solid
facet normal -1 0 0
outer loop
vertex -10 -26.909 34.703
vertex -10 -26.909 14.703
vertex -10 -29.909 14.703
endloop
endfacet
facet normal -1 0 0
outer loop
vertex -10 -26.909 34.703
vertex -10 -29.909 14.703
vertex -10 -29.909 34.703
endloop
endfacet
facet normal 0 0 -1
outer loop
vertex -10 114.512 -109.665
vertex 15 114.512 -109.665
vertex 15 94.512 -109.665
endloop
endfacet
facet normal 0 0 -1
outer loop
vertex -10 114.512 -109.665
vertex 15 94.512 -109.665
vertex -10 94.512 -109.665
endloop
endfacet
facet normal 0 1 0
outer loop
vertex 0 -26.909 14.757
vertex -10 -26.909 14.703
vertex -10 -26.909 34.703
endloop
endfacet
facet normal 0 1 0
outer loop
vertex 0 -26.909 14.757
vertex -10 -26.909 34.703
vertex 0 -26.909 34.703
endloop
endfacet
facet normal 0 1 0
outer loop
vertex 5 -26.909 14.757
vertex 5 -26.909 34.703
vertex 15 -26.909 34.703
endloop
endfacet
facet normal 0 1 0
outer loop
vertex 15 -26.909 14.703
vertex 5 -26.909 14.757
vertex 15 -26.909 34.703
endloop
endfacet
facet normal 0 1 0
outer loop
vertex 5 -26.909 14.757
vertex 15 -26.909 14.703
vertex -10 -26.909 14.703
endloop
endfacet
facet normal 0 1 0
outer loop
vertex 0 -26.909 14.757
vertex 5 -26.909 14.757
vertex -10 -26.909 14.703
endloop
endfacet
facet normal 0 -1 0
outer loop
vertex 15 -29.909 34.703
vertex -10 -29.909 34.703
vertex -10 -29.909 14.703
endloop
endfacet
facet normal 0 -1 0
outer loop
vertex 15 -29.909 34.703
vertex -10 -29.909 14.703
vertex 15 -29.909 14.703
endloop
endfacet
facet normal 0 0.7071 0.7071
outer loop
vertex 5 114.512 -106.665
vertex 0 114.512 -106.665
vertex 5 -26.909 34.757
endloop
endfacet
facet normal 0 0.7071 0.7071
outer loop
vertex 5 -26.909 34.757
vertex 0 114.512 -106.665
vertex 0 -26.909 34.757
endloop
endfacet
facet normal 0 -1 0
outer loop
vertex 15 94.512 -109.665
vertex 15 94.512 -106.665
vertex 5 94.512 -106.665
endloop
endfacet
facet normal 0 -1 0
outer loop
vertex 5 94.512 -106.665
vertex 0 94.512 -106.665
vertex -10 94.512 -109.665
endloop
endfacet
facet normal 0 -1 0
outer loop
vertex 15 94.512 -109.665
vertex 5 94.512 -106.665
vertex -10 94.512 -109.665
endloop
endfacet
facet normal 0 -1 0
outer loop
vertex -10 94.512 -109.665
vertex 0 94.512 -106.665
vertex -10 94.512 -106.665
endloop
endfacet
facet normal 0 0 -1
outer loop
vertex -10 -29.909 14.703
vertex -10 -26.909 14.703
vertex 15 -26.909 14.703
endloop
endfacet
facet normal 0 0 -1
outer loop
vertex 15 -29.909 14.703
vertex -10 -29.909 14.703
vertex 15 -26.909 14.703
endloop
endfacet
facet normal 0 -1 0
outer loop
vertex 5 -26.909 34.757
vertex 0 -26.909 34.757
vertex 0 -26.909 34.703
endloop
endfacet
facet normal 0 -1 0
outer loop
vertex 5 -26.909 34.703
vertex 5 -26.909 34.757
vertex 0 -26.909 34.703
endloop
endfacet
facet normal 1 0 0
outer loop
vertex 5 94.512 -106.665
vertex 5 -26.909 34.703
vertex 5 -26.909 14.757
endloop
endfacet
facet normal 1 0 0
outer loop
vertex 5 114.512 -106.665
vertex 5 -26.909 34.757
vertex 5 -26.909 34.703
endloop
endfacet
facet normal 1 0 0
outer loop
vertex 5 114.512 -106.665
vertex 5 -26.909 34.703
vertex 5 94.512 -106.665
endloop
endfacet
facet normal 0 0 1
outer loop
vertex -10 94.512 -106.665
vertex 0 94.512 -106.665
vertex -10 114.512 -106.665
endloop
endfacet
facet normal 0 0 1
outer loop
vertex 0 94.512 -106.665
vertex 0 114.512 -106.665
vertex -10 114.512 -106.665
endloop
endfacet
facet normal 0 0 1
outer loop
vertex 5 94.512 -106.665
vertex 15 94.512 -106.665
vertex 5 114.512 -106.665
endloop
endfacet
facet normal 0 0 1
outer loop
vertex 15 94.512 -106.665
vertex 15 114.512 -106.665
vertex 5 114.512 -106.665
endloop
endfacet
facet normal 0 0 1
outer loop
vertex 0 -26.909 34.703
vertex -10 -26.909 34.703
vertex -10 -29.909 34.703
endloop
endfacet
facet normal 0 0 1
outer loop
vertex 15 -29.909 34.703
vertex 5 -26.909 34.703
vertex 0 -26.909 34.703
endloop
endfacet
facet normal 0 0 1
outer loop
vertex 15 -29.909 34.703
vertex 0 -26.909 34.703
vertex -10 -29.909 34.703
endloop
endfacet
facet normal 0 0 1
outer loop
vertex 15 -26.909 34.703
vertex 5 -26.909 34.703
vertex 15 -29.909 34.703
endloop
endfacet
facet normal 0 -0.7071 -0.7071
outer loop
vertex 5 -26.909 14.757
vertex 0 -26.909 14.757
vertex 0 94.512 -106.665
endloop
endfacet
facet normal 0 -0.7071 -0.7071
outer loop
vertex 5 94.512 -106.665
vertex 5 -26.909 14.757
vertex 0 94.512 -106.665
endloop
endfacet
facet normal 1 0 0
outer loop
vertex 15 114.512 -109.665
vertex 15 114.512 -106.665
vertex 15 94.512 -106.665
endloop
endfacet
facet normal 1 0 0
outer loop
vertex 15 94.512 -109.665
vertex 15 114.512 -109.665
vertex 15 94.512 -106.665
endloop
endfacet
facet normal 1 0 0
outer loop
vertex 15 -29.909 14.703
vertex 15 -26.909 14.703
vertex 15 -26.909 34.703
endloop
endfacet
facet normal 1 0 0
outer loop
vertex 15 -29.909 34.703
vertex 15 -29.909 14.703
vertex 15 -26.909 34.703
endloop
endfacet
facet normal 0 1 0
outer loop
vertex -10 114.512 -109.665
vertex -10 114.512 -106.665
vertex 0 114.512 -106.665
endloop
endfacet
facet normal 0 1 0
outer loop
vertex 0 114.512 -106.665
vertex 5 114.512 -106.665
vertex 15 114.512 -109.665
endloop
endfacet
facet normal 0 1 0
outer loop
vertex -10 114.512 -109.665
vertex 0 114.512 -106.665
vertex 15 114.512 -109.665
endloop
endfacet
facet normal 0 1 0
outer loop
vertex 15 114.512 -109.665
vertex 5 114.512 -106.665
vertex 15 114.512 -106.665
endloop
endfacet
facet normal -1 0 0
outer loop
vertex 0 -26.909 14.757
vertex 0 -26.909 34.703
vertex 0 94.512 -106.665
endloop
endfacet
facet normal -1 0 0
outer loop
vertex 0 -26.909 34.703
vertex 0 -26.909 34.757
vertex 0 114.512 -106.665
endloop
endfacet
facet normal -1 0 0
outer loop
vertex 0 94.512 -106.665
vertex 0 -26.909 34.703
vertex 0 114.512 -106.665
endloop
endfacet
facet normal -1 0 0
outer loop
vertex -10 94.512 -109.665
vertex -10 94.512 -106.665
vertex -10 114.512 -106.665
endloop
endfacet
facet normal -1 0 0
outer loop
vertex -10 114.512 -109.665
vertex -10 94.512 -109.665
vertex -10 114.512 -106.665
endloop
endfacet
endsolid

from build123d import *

# Parameters (mm, degrees)
BOSS_EXTRUDE1_DEPTH = 5
SKETCH2_W           = 25
SKETCH2_H           = 20
BOSS_EXTRUDE2_DEPTH = 3
BOSS_EXTRUDE3_DEPTH = 3


with BuildPart() as part:
    # Sketch1 → Boss-Extrude1 (new body)
    with BuildSketch(Plane(origin=(0, 0, 0), x_dir=(0, 0, -1), z_dir=(1, 0, 0))):
        Polygon((106.664666231, 114.512097991), (-34.756690006, -26.909258246), (-14.756690006, -26.909258246), (106.664666231, 94.512097991), align=None)
    extrude(amount=BOSS_EXTRUDE1_DEPTH)

    # Sketch2 → Boss-Extrude2 (add)
    with BuildSketch(Plane.XZ.offset(26.909258246)):
        with Locations((2.5, 24.703284183)):
            Rectangle(SKETCH2_W, SKETCH2_H)
    extrude(amount=BOSS_EXTRUDE2_DEPTH)

    # Sketch3 → Boss-Extrude3 (add)
    with BuildSketch(Plane(origin=(0, 0, -106.664666231), x_dir=(-1, 0, 0), z_dir=(0, 0, -1))):
        Polygon((8.72832764, 94.512097991), (10, 94.512097991), (10, 114.512097991), (-15, 114.512097991), (-15, 94.512097991), align=None)
    extrude(amount=BOSS_EXTRUDE3_DEPTH)


solid = part.part
